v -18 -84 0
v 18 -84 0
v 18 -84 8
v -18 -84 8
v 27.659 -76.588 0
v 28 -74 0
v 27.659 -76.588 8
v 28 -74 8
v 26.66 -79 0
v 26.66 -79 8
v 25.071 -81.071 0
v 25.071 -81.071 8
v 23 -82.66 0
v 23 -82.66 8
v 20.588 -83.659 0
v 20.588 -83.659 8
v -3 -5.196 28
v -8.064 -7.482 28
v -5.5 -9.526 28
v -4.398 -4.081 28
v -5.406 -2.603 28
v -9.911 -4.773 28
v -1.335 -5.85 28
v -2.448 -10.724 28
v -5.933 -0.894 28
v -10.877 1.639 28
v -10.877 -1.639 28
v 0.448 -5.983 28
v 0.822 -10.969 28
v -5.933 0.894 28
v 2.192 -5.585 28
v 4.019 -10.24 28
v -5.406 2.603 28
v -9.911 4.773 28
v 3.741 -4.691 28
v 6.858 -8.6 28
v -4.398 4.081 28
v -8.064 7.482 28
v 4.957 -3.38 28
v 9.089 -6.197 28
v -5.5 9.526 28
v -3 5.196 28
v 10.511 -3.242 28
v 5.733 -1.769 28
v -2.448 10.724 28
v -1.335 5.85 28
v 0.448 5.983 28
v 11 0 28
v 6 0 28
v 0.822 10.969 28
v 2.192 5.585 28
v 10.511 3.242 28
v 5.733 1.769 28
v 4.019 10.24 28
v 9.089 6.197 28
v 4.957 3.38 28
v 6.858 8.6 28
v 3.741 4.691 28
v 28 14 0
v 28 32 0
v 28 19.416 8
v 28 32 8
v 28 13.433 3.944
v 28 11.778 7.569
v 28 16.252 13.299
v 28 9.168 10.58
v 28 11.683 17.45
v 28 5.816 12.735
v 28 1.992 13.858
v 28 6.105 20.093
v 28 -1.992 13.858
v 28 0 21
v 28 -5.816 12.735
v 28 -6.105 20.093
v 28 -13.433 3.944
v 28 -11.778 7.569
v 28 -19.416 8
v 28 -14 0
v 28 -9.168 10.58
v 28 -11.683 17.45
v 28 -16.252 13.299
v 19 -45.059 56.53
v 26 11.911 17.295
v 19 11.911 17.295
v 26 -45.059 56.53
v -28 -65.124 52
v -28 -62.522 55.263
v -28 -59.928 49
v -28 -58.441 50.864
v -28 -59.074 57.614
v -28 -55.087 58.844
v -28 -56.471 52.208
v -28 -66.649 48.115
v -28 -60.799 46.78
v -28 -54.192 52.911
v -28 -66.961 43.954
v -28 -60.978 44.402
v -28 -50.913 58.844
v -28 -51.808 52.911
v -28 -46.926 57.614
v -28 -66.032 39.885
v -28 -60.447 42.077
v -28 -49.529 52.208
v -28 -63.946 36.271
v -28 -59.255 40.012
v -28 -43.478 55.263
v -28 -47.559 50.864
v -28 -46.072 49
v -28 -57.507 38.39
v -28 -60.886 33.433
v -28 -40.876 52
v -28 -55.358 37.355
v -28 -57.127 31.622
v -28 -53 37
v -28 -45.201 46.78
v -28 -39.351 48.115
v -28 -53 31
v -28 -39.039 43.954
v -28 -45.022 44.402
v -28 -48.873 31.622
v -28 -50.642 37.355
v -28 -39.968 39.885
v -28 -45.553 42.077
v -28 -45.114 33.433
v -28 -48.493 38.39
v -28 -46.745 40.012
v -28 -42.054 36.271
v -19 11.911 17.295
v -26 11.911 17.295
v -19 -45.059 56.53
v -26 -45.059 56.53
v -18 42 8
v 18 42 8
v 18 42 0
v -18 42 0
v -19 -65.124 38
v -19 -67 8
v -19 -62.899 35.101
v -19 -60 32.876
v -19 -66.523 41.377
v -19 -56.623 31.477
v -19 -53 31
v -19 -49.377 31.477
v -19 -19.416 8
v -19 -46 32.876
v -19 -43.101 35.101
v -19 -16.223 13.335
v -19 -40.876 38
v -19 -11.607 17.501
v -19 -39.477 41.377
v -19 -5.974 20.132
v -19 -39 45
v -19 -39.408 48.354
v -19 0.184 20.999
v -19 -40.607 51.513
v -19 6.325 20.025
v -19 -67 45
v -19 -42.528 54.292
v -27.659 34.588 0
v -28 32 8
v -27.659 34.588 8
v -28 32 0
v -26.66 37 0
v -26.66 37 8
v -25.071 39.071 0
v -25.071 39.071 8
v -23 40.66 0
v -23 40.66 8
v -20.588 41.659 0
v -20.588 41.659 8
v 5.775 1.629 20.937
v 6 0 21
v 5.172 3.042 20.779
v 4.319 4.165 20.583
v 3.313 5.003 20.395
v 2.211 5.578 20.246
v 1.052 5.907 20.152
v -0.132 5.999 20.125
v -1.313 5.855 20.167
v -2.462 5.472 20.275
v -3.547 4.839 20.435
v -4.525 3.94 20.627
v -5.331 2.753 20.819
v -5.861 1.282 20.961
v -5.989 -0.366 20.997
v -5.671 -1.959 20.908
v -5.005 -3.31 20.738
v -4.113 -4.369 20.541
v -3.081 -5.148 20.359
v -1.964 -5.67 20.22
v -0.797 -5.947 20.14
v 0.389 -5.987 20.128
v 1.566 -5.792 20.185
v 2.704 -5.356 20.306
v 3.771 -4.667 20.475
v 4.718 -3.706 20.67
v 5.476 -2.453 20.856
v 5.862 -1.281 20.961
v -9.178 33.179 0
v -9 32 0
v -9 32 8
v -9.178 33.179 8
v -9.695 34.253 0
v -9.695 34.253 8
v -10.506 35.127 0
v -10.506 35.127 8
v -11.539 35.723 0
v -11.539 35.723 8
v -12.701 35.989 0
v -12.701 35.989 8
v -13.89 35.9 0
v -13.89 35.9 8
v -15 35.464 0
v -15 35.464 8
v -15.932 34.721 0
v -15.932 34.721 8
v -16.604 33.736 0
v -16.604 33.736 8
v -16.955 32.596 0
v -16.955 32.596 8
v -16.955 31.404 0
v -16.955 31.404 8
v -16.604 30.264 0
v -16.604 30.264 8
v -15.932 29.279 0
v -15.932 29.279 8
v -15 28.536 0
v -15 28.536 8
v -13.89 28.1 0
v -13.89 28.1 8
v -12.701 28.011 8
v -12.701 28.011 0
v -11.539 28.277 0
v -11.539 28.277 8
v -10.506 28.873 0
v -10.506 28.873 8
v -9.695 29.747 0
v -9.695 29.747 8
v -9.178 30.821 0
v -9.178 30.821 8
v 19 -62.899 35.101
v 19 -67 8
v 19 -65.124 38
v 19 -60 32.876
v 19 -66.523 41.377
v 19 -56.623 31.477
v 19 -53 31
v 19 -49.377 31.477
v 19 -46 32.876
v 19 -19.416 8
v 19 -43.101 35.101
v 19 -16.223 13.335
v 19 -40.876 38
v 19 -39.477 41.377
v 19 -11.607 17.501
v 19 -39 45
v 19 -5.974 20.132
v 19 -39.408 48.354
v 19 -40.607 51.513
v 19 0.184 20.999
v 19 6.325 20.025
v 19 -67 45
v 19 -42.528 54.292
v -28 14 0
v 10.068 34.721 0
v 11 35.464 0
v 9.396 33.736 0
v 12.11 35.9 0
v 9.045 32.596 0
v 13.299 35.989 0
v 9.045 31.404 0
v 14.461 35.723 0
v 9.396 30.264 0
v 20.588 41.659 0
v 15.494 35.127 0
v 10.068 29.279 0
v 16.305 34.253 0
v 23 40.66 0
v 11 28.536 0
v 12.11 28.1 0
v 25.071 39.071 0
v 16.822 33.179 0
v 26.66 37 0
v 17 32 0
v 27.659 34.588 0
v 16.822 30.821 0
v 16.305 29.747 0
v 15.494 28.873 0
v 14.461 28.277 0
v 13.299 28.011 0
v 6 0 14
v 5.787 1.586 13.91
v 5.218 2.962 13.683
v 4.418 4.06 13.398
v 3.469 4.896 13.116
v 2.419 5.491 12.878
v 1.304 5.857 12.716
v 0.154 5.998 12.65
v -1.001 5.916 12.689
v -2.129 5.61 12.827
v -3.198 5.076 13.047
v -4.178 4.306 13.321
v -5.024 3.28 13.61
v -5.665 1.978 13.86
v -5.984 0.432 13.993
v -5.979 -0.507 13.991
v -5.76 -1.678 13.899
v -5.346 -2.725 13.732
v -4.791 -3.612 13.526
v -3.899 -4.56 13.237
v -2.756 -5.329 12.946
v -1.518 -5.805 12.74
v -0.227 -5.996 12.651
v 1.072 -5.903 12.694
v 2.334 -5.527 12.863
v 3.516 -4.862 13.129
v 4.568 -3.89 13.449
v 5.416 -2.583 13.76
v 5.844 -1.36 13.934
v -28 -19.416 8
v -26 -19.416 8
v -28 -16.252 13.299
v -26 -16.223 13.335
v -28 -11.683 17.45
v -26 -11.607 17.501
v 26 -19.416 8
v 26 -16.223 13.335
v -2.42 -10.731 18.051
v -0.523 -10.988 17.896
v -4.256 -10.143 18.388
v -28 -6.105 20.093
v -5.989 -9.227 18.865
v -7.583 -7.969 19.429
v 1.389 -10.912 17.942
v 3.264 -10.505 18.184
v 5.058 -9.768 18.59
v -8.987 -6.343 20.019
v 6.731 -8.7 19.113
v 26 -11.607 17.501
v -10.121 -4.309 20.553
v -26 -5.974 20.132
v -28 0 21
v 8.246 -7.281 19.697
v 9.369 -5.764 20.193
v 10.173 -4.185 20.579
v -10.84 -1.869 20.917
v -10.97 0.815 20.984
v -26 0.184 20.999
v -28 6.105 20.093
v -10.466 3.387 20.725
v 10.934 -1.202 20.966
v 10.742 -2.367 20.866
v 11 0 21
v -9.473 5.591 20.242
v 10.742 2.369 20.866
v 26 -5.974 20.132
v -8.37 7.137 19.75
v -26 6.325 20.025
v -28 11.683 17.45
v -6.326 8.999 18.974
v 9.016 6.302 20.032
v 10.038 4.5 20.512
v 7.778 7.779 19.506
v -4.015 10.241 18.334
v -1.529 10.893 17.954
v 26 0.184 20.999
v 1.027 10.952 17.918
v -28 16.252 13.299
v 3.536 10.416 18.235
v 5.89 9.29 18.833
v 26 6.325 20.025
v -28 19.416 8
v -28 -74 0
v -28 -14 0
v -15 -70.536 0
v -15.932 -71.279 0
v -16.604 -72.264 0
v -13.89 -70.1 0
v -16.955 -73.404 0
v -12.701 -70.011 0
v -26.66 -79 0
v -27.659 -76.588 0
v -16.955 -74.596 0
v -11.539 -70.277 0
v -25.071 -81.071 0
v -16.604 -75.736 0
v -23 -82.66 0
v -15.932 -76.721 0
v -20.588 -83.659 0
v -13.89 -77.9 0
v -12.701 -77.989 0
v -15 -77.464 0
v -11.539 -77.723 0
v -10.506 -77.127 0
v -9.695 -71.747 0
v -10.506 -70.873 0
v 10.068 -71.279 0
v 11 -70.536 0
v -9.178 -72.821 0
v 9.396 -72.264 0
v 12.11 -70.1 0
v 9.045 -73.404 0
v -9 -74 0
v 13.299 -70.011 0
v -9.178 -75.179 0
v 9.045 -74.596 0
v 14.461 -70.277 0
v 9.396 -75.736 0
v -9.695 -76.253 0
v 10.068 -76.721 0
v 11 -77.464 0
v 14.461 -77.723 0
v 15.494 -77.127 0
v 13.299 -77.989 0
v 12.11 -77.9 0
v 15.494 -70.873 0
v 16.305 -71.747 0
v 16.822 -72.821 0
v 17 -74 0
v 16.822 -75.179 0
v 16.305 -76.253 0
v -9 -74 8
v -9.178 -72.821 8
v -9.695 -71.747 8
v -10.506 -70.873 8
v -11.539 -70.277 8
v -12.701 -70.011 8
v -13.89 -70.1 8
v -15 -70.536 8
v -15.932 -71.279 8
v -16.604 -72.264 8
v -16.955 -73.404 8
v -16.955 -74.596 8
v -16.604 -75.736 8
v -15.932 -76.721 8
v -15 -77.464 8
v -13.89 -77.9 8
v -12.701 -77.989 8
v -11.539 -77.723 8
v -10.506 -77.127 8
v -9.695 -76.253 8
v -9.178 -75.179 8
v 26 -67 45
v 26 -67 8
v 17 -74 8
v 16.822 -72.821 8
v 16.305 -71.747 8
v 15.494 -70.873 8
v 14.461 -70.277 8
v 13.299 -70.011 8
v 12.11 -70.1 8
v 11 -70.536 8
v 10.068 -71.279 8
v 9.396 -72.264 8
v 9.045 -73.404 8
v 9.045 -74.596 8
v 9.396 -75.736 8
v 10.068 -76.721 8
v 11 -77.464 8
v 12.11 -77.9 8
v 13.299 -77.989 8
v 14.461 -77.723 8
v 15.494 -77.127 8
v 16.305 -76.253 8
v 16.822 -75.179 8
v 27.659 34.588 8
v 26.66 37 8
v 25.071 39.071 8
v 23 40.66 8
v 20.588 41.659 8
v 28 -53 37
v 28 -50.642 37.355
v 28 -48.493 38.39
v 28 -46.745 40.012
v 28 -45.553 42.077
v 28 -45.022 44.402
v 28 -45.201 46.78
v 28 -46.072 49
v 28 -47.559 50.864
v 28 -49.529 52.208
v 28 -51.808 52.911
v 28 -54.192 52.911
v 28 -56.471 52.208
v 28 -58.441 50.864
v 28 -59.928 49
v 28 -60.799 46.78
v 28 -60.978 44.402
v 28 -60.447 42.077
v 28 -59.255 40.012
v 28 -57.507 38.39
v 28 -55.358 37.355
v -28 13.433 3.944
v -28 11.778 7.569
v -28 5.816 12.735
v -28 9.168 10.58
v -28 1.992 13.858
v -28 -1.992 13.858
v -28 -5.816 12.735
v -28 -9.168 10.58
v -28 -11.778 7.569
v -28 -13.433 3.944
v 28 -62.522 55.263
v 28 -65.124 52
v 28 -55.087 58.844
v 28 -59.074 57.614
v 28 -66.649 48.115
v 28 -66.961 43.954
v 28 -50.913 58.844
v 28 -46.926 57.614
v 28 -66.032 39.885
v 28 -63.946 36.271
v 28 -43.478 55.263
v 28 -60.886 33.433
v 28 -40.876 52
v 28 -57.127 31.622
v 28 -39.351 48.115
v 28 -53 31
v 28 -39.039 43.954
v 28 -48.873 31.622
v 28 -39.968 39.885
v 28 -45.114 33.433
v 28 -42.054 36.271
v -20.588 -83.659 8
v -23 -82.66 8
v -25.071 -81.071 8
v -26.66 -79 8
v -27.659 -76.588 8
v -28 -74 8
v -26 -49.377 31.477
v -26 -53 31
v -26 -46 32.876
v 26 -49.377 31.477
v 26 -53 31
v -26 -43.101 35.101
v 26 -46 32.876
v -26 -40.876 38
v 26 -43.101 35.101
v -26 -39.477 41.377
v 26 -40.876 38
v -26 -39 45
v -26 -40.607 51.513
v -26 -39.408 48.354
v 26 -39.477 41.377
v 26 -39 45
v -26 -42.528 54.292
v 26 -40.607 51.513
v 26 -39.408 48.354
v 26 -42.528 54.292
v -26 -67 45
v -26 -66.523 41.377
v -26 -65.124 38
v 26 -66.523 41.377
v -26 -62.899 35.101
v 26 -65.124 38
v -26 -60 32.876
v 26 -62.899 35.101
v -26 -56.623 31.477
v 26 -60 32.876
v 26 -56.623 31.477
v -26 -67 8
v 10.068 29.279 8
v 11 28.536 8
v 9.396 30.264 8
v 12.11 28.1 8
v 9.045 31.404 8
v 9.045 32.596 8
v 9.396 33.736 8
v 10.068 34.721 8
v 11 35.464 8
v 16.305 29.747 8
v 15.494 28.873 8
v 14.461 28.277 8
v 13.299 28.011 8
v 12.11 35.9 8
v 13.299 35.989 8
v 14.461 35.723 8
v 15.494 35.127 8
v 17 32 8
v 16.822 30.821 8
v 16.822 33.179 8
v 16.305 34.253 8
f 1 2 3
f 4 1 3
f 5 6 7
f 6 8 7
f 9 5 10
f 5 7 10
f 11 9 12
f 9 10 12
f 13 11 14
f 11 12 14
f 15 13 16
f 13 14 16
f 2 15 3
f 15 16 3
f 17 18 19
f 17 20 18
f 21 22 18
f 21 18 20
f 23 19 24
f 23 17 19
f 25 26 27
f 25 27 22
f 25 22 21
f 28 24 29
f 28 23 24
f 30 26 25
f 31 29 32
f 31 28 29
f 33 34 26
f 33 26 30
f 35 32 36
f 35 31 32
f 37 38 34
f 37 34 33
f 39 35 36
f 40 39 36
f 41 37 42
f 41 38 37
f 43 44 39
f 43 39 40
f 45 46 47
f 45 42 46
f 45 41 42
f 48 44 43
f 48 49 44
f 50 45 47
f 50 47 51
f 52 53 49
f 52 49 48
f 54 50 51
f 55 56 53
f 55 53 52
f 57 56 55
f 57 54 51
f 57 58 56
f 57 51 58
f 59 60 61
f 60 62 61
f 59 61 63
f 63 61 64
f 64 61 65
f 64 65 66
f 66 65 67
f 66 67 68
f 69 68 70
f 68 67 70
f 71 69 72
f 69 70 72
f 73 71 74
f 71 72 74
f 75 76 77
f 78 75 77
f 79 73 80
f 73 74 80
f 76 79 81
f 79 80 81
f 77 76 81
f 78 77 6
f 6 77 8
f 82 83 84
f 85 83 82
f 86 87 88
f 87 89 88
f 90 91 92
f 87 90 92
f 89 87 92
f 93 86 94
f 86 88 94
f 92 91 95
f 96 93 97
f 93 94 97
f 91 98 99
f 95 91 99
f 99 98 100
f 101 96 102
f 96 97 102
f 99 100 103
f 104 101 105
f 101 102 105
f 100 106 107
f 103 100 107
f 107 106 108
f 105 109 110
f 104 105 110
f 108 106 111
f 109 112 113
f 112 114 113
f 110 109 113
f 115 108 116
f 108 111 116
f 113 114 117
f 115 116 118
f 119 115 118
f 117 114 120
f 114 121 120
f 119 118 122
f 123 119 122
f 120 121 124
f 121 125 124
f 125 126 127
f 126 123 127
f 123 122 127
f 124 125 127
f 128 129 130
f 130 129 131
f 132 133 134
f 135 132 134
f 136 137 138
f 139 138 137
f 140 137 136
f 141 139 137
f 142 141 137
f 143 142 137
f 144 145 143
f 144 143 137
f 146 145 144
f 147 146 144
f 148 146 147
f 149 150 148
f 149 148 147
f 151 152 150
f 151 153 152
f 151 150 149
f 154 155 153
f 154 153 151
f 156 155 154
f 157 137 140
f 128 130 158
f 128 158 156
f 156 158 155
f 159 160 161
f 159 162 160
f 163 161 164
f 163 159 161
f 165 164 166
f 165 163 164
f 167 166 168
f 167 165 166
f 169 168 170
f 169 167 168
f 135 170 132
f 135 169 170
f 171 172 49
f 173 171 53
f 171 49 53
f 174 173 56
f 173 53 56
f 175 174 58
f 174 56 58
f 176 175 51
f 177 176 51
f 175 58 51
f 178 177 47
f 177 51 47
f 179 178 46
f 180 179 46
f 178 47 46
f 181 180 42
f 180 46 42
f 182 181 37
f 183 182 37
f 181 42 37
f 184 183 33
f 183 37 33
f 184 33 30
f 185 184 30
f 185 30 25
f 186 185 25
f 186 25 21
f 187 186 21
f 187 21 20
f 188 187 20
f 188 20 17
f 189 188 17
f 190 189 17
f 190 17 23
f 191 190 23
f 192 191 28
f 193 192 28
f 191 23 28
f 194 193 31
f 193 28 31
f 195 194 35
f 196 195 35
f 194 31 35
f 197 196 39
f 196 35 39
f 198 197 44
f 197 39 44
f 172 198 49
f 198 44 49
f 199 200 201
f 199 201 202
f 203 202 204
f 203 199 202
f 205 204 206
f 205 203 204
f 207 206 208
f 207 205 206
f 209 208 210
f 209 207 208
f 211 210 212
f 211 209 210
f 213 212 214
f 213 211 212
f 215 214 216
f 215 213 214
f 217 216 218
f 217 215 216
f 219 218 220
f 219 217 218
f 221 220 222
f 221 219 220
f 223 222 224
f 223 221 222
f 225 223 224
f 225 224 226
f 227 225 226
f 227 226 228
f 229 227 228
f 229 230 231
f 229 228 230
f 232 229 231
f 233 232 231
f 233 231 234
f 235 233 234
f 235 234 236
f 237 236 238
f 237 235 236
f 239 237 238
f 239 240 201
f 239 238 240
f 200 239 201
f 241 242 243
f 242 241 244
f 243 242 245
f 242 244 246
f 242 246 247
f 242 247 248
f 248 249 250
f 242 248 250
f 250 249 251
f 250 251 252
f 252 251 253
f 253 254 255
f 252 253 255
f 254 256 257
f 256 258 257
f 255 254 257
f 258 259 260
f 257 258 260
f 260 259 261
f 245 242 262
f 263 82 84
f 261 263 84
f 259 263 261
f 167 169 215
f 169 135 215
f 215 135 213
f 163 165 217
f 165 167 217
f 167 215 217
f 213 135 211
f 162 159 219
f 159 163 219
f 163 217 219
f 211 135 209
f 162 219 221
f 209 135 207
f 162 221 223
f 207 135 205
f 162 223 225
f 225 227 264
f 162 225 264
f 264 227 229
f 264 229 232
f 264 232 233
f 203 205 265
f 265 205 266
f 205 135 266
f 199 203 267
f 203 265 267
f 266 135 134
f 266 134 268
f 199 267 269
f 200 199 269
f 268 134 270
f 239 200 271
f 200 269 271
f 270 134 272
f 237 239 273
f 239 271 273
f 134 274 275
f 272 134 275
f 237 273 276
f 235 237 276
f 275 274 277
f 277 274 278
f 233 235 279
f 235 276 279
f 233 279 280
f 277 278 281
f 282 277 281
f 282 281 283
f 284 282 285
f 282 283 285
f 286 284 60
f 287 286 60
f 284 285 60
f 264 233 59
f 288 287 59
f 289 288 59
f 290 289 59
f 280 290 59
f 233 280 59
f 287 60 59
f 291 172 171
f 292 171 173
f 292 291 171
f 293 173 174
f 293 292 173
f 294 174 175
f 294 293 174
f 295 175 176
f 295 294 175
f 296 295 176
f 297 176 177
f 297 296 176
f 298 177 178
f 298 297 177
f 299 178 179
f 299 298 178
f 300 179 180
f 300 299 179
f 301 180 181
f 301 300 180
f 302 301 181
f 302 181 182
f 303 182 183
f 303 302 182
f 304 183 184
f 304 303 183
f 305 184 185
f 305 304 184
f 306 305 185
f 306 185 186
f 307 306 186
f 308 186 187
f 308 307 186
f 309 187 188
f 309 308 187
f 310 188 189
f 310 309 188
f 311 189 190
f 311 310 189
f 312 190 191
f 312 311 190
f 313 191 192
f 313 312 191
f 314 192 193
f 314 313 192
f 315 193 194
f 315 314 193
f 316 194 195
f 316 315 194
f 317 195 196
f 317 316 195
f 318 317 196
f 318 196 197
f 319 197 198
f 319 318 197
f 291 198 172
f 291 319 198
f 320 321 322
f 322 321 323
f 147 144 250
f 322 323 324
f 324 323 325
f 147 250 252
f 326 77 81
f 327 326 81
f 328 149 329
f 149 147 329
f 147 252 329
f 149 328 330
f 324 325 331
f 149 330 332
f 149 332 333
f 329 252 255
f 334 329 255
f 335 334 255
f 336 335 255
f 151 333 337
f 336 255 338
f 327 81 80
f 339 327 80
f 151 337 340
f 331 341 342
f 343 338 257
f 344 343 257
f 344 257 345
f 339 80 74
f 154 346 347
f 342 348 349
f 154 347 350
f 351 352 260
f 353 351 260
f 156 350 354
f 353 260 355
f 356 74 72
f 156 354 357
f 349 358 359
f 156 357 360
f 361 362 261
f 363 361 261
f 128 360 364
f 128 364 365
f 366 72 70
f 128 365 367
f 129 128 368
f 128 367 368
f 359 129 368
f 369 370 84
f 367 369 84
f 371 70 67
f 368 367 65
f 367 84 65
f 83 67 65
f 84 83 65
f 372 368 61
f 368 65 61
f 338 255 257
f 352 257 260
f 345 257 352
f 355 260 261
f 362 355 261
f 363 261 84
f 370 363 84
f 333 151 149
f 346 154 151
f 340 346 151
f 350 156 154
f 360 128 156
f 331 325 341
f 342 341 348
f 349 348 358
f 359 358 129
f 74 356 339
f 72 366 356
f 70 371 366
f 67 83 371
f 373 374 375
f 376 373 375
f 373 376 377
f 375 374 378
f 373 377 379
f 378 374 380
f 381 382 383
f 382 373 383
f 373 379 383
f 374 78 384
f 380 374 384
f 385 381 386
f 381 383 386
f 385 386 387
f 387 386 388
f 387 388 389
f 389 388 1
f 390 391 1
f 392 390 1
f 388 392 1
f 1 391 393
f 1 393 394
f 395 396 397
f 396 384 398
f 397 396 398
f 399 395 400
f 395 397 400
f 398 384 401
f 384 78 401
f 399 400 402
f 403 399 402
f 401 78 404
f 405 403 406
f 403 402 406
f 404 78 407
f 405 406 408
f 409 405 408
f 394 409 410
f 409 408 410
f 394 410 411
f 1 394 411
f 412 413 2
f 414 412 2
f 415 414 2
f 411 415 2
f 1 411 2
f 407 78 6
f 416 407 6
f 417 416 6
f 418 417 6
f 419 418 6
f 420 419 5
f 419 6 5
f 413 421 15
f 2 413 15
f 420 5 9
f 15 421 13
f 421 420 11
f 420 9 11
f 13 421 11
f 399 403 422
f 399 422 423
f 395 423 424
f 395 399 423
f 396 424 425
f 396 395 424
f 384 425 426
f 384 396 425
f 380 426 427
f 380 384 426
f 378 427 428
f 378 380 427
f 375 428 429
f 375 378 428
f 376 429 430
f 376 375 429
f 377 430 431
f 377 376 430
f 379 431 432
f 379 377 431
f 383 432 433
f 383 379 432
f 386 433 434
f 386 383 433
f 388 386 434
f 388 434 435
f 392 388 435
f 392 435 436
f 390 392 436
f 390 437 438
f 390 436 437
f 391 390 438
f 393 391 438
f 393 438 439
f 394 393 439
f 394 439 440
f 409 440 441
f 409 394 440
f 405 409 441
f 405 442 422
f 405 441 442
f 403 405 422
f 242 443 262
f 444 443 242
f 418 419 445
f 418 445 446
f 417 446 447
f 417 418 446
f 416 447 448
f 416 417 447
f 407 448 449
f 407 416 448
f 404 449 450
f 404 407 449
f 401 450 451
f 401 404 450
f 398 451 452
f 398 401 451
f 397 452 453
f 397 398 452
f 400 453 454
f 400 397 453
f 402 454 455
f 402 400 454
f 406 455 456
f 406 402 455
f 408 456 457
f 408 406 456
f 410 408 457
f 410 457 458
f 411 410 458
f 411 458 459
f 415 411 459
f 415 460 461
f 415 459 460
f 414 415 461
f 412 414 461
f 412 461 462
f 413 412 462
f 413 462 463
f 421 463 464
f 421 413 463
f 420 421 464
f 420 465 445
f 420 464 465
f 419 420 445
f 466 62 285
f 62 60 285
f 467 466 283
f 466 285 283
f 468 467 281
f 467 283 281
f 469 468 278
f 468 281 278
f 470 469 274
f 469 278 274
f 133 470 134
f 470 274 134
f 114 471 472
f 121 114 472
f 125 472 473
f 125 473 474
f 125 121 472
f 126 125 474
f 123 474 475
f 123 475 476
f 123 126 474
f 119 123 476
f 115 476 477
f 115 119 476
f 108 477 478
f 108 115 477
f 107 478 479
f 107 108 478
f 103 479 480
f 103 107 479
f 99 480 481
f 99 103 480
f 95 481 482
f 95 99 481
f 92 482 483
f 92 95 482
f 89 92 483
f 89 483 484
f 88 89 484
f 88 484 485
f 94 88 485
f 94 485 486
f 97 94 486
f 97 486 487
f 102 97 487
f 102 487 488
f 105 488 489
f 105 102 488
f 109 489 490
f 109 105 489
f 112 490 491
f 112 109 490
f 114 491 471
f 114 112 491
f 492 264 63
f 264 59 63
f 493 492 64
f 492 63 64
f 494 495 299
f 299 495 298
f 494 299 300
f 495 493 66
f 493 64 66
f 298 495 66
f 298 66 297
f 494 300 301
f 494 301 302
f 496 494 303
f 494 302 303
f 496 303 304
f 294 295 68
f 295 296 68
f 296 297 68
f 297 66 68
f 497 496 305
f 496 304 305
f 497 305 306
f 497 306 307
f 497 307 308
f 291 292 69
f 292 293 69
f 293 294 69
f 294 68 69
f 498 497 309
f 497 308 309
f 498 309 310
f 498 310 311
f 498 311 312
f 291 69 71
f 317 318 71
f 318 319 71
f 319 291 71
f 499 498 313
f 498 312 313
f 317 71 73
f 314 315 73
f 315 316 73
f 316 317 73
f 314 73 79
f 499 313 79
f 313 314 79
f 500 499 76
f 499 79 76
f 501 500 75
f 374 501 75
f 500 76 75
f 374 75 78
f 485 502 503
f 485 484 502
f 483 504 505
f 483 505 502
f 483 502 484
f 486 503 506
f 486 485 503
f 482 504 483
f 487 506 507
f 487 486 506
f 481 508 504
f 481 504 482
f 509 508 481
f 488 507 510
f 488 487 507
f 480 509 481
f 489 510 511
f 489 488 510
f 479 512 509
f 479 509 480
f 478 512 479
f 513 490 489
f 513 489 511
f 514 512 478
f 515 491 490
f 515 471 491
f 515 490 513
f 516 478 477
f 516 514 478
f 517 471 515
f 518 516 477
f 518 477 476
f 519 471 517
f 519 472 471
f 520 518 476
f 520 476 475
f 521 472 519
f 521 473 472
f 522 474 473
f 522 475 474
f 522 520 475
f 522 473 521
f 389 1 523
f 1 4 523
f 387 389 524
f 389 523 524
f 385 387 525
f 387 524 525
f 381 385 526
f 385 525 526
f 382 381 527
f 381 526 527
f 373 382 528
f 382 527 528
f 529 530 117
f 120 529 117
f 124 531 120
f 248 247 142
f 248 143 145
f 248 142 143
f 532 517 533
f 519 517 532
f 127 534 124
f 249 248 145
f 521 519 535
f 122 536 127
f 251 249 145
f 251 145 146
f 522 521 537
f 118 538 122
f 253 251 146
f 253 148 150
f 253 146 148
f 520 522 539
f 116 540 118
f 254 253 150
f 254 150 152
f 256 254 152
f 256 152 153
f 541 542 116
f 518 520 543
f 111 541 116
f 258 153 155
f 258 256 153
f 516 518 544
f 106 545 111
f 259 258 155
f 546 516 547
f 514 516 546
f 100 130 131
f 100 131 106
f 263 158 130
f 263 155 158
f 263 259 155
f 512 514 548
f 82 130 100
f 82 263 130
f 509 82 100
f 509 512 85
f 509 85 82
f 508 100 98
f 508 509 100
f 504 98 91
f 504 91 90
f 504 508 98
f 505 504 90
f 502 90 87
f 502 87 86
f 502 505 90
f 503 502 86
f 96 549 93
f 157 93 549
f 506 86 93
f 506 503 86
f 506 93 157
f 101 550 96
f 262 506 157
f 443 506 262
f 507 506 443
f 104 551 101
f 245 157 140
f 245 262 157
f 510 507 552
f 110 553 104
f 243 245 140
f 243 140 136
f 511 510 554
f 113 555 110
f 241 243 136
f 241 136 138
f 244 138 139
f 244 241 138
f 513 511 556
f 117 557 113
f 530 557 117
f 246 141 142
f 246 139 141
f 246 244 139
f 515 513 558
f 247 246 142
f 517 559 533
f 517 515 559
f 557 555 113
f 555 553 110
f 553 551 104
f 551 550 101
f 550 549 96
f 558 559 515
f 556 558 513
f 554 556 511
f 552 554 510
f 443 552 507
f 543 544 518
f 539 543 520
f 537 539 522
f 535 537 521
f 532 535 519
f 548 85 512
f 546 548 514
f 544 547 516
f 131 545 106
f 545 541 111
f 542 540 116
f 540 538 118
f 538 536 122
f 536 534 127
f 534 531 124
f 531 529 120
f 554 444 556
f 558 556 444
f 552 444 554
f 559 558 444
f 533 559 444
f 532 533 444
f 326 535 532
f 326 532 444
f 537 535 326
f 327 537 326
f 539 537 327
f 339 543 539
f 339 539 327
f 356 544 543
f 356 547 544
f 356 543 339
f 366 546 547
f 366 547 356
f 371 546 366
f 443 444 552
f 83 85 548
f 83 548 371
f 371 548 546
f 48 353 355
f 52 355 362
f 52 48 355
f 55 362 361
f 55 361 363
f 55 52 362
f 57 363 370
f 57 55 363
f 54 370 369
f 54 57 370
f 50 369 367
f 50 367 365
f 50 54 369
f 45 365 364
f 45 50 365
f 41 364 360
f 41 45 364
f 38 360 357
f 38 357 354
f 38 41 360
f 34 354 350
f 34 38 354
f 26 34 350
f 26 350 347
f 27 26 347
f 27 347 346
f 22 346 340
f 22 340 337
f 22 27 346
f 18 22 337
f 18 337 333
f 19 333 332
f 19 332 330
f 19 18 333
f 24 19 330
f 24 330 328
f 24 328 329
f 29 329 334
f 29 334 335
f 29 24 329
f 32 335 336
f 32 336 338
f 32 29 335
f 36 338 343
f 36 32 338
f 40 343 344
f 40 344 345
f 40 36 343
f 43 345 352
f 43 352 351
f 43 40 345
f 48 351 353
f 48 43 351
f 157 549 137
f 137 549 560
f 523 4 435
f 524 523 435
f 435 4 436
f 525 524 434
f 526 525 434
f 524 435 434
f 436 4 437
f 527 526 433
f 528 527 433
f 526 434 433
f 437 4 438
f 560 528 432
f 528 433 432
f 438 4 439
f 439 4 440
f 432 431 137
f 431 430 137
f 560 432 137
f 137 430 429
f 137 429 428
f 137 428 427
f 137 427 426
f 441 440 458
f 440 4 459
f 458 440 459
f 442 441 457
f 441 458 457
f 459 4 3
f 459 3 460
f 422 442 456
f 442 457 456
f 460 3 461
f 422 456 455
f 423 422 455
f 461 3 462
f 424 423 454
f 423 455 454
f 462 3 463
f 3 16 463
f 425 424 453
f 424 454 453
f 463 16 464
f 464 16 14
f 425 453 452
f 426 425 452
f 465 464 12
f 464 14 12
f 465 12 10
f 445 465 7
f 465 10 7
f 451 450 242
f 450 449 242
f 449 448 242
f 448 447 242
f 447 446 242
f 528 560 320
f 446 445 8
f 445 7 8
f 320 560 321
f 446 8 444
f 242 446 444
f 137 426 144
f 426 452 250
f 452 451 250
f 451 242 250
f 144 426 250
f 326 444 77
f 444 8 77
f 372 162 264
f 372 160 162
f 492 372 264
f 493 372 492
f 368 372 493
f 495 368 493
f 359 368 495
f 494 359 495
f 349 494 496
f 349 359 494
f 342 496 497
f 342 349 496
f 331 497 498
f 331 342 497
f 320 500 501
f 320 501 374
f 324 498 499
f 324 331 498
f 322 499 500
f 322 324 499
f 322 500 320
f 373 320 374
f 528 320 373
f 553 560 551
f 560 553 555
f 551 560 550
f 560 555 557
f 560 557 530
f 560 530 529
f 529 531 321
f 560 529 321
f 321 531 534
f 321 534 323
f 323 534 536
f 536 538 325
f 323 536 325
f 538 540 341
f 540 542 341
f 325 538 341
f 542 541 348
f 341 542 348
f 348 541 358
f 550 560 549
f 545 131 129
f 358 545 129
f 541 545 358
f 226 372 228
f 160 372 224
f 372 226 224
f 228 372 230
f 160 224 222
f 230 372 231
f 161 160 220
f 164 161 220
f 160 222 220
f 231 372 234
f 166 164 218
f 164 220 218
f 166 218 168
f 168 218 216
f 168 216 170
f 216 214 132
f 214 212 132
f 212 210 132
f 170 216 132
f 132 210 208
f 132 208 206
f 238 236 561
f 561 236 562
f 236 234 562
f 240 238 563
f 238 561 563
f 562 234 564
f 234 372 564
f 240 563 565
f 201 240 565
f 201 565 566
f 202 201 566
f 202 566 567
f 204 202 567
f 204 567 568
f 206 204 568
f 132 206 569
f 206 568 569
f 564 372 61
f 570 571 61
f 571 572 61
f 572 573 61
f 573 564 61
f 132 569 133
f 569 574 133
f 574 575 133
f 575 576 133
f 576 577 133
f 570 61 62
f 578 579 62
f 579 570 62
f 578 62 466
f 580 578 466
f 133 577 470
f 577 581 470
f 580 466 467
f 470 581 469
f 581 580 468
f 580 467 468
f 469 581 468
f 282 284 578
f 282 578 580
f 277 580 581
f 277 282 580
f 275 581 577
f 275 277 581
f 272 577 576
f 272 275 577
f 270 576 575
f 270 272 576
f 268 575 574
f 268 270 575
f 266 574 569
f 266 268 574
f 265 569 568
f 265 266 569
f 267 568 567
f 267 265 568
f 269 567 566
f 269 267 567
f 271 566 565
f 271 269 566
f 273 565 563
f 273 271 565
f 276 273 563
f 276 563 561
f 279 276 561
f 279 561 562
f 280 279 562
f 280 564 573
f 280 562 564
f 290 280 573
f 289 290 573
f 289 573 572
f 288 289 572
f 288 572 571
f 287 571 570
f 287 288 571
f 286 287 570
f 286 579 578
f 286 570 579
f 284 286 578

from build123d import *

# Parameters (mm, degrees)
BOSS_EXTRUDE1_DEPTH      = 28
FILLET1_R                = 10
SKETCH2_R                = 14
SKETCH2_R_2              = 8
BOSS_EXTRUDE3_DEPTH      = 28
BOSS_EXTRUDE4_START      = 7
BOSS_EXTRUDE4_DEPTH      = 7
BOSS_EXTRUDE5_REACH      = 95.814
BOSS_EXTRUDE5_END_RADIUS = 21
SKETCH5_R                = 11
SKETCH5_R_2              = 6
CUT_EXTRUDE1_DEPTH       = 94.813645093
CUT_EXTRUDE1_DEPTH_BACK  = 94.813645093
SKETCH6_R                = 6
CUT_EXTRUDE2_DEPTH       = 103.181211608
CUT_EXTRUDE2_DEPTH_BACK  = 103.181211608
SKETCH8_R                = 4
CUT_EXTRUDE3_DEPTH       = 103.181211608
CUT_EXTRUDE3_DEPTH_BACK  = 103.181211608
SKETCH9_R                = 4


with BuildPart() as part:
    # Sketch1 → Boss-Extrude1 (new, symmetric)
    with BuildSketch(Plane.YZ):
        with BuildLine():
            Line((42, 0), (14, 0))
            ThreePointArc((14, 0), (0, 14), (-14, 0))
            Line((-14, 0), (-84, 0))
            Line((-84, 0), (-84, 8))
            Line((-84, 8), (-19.416487839, 8))
            ThreePointArc((-19.416487839, 8), (0, 21), (19.416487839, 8))
            Line((19.416487839, 8), (42, 8))
            Line((42, 8), (42, 0))
        make_face()
    extrude(amount=BOSS_EXTRUDE1_DEPTH, both=True)

    # Fillet1
    fillet1_edges = [part.edges().sort_by_distance(p)[0] for p in [
        (-28, 42, 4),
        (28, -84, 4),
        (28, 42, 4),
        (-28, -84, 4),
    ]]
    fillet(fillet1_edges, radius=FILLET1_R)



with BuildPart() as body_2:
    # Sketch2 → Boss-Extrude3 (new, symmetric)
    with BuildSketch(Plane.YZ):
        with Locations(Location((-53, 45, 0), (0, 0, 270))):
            Circle(SKETCH2_R)
        with Locations(Location((-53, 45, 0), (0, 0, 270))):
            Circle(SKETCH2_R_2, mode=Mode.SUBTRACT)
    extrude(amount=BOSS_EXTRUDE3_DEPTH, both=True)


with BuildPart() as part_1:
    add(part.part)

    add(body_2.part)  # Boss-Extrude4 merges body 2
    # Sketch3 → Boss-Extrude4 (add)
    with BuildSketch(Plane.YZ.offset(19).offset(BOSS_EXTRUDE4_START)):
        with BuildLine():
            ThreePointArc((-39, 45), (-53, 31), (-67, 45))
            Line((-67, 45), (-67, 8))
            Line((-67, 8), (-19.416487839, 8))
            ThreePointArc((-19.416487839, 8), (-5.973550046, 20.132478731), (11.911075968, 17.295267251))
            Line((11.911075968, 17.295267251), (-45.059282688, 56.530178167))
            ThreePointArc((-45.059282688, 56.530178167), (-40.607057606, 51.512678314), (-39, 45))
        make_face()
    boss_extrude4 = extrude(amount=-BOSS_EXTRUDE4_DEPTH)

    # Mirror1: Boss-Extrude4 across plane
    add(boss_extrude4.mirror(Plane(origin=(0, 0, 0), x_dir=(0, 0, 1), z_dir=(1, 0, 0))))

    # Boss-Extrude5: up to this cylinder (the profile starts outside it)
    boss_extrude5_end = Plane(origin=(-10.688873, 0, 0), z_dir=(-1, 0, 0)) * Cylinder(BOSS_EXTRUDE5_END_RADIUS, 234.628, mode=Mode.PRIVATE)
    # Sketch5 → Boss-Extrude5 (add, up to the surface)
    with BuildSketch(Plane.XY.offset(28), mode=Mode.PRIVATE) as boss_extrude5_sk1:
        Circle(SKETCH5_R)
        Circle(SKETCH5_R_2, mode=Mode.SUBTRACT)
    boss_extrude5_tool1 = extrude(boss_extrude5_sk1.sketch, amount=-BOSS_EXTRUDE5_REACH, mode=Mode.PRIVATE) - boss_extrude5_end
    add(boss_extrude5_tool1.solids().sort_by_distance((-10.688873, 0, 28))[0])

    # Sketch6 → Cut-Extrude1 (cut, two sides: drawn at the far end of the back side and taken through both)
    with BuildSketch(Plane.XY.offset(28).offset(-CUT_EXTRUDE1_DEPTH_BACK)):
        Circle(SKETCH6_R)
    extrude(amount=CUT_EXTRUDE1_DEPTH + CUT_EXTRUDE1_DEPTH_BACK, mode=Mode.SUBTRACT)

    # Sketch8 → Cut-Extrude2 (cut, two sides: drawn at the far end of the back side and taken through both)
    with BuildSketch(Plane.XY.offset(8).offset(-CUT_EXTRUDE2_DEPTH_BACK)):
        with Locations((-13, 32)):
            Circle(SKETCH8_R)
        with Locations((13, 32)):
            Circle(SKETCH8_R)
    extrude(amount=CUT_EXTRUDE2_DEPTH + CUT_EXTRUDE2_DEPTH_BACK, mode=Mode.SUBTRACT)

    # Sketch9 → Cut-Extrude3 (cut, two sides: drawn at the far end of the back side and taken through both)
    with BuildSketch(Plane.XY.offset(8).offset(-CUT_EXTRUDE3_DEPTH_BACK)):
        with Locations((-13, -74)):
            Circle(SKETCH9_R)
        with Locations((13, -74)):
            Circle(SKETCH9_R)
    extrude(amount=CUT_EXTRUDE3_DEPTH + CUT_EXTRUDE3_DEPTH_BACK, mode=Mode.SUBTRACT)


solid = part_1.part
